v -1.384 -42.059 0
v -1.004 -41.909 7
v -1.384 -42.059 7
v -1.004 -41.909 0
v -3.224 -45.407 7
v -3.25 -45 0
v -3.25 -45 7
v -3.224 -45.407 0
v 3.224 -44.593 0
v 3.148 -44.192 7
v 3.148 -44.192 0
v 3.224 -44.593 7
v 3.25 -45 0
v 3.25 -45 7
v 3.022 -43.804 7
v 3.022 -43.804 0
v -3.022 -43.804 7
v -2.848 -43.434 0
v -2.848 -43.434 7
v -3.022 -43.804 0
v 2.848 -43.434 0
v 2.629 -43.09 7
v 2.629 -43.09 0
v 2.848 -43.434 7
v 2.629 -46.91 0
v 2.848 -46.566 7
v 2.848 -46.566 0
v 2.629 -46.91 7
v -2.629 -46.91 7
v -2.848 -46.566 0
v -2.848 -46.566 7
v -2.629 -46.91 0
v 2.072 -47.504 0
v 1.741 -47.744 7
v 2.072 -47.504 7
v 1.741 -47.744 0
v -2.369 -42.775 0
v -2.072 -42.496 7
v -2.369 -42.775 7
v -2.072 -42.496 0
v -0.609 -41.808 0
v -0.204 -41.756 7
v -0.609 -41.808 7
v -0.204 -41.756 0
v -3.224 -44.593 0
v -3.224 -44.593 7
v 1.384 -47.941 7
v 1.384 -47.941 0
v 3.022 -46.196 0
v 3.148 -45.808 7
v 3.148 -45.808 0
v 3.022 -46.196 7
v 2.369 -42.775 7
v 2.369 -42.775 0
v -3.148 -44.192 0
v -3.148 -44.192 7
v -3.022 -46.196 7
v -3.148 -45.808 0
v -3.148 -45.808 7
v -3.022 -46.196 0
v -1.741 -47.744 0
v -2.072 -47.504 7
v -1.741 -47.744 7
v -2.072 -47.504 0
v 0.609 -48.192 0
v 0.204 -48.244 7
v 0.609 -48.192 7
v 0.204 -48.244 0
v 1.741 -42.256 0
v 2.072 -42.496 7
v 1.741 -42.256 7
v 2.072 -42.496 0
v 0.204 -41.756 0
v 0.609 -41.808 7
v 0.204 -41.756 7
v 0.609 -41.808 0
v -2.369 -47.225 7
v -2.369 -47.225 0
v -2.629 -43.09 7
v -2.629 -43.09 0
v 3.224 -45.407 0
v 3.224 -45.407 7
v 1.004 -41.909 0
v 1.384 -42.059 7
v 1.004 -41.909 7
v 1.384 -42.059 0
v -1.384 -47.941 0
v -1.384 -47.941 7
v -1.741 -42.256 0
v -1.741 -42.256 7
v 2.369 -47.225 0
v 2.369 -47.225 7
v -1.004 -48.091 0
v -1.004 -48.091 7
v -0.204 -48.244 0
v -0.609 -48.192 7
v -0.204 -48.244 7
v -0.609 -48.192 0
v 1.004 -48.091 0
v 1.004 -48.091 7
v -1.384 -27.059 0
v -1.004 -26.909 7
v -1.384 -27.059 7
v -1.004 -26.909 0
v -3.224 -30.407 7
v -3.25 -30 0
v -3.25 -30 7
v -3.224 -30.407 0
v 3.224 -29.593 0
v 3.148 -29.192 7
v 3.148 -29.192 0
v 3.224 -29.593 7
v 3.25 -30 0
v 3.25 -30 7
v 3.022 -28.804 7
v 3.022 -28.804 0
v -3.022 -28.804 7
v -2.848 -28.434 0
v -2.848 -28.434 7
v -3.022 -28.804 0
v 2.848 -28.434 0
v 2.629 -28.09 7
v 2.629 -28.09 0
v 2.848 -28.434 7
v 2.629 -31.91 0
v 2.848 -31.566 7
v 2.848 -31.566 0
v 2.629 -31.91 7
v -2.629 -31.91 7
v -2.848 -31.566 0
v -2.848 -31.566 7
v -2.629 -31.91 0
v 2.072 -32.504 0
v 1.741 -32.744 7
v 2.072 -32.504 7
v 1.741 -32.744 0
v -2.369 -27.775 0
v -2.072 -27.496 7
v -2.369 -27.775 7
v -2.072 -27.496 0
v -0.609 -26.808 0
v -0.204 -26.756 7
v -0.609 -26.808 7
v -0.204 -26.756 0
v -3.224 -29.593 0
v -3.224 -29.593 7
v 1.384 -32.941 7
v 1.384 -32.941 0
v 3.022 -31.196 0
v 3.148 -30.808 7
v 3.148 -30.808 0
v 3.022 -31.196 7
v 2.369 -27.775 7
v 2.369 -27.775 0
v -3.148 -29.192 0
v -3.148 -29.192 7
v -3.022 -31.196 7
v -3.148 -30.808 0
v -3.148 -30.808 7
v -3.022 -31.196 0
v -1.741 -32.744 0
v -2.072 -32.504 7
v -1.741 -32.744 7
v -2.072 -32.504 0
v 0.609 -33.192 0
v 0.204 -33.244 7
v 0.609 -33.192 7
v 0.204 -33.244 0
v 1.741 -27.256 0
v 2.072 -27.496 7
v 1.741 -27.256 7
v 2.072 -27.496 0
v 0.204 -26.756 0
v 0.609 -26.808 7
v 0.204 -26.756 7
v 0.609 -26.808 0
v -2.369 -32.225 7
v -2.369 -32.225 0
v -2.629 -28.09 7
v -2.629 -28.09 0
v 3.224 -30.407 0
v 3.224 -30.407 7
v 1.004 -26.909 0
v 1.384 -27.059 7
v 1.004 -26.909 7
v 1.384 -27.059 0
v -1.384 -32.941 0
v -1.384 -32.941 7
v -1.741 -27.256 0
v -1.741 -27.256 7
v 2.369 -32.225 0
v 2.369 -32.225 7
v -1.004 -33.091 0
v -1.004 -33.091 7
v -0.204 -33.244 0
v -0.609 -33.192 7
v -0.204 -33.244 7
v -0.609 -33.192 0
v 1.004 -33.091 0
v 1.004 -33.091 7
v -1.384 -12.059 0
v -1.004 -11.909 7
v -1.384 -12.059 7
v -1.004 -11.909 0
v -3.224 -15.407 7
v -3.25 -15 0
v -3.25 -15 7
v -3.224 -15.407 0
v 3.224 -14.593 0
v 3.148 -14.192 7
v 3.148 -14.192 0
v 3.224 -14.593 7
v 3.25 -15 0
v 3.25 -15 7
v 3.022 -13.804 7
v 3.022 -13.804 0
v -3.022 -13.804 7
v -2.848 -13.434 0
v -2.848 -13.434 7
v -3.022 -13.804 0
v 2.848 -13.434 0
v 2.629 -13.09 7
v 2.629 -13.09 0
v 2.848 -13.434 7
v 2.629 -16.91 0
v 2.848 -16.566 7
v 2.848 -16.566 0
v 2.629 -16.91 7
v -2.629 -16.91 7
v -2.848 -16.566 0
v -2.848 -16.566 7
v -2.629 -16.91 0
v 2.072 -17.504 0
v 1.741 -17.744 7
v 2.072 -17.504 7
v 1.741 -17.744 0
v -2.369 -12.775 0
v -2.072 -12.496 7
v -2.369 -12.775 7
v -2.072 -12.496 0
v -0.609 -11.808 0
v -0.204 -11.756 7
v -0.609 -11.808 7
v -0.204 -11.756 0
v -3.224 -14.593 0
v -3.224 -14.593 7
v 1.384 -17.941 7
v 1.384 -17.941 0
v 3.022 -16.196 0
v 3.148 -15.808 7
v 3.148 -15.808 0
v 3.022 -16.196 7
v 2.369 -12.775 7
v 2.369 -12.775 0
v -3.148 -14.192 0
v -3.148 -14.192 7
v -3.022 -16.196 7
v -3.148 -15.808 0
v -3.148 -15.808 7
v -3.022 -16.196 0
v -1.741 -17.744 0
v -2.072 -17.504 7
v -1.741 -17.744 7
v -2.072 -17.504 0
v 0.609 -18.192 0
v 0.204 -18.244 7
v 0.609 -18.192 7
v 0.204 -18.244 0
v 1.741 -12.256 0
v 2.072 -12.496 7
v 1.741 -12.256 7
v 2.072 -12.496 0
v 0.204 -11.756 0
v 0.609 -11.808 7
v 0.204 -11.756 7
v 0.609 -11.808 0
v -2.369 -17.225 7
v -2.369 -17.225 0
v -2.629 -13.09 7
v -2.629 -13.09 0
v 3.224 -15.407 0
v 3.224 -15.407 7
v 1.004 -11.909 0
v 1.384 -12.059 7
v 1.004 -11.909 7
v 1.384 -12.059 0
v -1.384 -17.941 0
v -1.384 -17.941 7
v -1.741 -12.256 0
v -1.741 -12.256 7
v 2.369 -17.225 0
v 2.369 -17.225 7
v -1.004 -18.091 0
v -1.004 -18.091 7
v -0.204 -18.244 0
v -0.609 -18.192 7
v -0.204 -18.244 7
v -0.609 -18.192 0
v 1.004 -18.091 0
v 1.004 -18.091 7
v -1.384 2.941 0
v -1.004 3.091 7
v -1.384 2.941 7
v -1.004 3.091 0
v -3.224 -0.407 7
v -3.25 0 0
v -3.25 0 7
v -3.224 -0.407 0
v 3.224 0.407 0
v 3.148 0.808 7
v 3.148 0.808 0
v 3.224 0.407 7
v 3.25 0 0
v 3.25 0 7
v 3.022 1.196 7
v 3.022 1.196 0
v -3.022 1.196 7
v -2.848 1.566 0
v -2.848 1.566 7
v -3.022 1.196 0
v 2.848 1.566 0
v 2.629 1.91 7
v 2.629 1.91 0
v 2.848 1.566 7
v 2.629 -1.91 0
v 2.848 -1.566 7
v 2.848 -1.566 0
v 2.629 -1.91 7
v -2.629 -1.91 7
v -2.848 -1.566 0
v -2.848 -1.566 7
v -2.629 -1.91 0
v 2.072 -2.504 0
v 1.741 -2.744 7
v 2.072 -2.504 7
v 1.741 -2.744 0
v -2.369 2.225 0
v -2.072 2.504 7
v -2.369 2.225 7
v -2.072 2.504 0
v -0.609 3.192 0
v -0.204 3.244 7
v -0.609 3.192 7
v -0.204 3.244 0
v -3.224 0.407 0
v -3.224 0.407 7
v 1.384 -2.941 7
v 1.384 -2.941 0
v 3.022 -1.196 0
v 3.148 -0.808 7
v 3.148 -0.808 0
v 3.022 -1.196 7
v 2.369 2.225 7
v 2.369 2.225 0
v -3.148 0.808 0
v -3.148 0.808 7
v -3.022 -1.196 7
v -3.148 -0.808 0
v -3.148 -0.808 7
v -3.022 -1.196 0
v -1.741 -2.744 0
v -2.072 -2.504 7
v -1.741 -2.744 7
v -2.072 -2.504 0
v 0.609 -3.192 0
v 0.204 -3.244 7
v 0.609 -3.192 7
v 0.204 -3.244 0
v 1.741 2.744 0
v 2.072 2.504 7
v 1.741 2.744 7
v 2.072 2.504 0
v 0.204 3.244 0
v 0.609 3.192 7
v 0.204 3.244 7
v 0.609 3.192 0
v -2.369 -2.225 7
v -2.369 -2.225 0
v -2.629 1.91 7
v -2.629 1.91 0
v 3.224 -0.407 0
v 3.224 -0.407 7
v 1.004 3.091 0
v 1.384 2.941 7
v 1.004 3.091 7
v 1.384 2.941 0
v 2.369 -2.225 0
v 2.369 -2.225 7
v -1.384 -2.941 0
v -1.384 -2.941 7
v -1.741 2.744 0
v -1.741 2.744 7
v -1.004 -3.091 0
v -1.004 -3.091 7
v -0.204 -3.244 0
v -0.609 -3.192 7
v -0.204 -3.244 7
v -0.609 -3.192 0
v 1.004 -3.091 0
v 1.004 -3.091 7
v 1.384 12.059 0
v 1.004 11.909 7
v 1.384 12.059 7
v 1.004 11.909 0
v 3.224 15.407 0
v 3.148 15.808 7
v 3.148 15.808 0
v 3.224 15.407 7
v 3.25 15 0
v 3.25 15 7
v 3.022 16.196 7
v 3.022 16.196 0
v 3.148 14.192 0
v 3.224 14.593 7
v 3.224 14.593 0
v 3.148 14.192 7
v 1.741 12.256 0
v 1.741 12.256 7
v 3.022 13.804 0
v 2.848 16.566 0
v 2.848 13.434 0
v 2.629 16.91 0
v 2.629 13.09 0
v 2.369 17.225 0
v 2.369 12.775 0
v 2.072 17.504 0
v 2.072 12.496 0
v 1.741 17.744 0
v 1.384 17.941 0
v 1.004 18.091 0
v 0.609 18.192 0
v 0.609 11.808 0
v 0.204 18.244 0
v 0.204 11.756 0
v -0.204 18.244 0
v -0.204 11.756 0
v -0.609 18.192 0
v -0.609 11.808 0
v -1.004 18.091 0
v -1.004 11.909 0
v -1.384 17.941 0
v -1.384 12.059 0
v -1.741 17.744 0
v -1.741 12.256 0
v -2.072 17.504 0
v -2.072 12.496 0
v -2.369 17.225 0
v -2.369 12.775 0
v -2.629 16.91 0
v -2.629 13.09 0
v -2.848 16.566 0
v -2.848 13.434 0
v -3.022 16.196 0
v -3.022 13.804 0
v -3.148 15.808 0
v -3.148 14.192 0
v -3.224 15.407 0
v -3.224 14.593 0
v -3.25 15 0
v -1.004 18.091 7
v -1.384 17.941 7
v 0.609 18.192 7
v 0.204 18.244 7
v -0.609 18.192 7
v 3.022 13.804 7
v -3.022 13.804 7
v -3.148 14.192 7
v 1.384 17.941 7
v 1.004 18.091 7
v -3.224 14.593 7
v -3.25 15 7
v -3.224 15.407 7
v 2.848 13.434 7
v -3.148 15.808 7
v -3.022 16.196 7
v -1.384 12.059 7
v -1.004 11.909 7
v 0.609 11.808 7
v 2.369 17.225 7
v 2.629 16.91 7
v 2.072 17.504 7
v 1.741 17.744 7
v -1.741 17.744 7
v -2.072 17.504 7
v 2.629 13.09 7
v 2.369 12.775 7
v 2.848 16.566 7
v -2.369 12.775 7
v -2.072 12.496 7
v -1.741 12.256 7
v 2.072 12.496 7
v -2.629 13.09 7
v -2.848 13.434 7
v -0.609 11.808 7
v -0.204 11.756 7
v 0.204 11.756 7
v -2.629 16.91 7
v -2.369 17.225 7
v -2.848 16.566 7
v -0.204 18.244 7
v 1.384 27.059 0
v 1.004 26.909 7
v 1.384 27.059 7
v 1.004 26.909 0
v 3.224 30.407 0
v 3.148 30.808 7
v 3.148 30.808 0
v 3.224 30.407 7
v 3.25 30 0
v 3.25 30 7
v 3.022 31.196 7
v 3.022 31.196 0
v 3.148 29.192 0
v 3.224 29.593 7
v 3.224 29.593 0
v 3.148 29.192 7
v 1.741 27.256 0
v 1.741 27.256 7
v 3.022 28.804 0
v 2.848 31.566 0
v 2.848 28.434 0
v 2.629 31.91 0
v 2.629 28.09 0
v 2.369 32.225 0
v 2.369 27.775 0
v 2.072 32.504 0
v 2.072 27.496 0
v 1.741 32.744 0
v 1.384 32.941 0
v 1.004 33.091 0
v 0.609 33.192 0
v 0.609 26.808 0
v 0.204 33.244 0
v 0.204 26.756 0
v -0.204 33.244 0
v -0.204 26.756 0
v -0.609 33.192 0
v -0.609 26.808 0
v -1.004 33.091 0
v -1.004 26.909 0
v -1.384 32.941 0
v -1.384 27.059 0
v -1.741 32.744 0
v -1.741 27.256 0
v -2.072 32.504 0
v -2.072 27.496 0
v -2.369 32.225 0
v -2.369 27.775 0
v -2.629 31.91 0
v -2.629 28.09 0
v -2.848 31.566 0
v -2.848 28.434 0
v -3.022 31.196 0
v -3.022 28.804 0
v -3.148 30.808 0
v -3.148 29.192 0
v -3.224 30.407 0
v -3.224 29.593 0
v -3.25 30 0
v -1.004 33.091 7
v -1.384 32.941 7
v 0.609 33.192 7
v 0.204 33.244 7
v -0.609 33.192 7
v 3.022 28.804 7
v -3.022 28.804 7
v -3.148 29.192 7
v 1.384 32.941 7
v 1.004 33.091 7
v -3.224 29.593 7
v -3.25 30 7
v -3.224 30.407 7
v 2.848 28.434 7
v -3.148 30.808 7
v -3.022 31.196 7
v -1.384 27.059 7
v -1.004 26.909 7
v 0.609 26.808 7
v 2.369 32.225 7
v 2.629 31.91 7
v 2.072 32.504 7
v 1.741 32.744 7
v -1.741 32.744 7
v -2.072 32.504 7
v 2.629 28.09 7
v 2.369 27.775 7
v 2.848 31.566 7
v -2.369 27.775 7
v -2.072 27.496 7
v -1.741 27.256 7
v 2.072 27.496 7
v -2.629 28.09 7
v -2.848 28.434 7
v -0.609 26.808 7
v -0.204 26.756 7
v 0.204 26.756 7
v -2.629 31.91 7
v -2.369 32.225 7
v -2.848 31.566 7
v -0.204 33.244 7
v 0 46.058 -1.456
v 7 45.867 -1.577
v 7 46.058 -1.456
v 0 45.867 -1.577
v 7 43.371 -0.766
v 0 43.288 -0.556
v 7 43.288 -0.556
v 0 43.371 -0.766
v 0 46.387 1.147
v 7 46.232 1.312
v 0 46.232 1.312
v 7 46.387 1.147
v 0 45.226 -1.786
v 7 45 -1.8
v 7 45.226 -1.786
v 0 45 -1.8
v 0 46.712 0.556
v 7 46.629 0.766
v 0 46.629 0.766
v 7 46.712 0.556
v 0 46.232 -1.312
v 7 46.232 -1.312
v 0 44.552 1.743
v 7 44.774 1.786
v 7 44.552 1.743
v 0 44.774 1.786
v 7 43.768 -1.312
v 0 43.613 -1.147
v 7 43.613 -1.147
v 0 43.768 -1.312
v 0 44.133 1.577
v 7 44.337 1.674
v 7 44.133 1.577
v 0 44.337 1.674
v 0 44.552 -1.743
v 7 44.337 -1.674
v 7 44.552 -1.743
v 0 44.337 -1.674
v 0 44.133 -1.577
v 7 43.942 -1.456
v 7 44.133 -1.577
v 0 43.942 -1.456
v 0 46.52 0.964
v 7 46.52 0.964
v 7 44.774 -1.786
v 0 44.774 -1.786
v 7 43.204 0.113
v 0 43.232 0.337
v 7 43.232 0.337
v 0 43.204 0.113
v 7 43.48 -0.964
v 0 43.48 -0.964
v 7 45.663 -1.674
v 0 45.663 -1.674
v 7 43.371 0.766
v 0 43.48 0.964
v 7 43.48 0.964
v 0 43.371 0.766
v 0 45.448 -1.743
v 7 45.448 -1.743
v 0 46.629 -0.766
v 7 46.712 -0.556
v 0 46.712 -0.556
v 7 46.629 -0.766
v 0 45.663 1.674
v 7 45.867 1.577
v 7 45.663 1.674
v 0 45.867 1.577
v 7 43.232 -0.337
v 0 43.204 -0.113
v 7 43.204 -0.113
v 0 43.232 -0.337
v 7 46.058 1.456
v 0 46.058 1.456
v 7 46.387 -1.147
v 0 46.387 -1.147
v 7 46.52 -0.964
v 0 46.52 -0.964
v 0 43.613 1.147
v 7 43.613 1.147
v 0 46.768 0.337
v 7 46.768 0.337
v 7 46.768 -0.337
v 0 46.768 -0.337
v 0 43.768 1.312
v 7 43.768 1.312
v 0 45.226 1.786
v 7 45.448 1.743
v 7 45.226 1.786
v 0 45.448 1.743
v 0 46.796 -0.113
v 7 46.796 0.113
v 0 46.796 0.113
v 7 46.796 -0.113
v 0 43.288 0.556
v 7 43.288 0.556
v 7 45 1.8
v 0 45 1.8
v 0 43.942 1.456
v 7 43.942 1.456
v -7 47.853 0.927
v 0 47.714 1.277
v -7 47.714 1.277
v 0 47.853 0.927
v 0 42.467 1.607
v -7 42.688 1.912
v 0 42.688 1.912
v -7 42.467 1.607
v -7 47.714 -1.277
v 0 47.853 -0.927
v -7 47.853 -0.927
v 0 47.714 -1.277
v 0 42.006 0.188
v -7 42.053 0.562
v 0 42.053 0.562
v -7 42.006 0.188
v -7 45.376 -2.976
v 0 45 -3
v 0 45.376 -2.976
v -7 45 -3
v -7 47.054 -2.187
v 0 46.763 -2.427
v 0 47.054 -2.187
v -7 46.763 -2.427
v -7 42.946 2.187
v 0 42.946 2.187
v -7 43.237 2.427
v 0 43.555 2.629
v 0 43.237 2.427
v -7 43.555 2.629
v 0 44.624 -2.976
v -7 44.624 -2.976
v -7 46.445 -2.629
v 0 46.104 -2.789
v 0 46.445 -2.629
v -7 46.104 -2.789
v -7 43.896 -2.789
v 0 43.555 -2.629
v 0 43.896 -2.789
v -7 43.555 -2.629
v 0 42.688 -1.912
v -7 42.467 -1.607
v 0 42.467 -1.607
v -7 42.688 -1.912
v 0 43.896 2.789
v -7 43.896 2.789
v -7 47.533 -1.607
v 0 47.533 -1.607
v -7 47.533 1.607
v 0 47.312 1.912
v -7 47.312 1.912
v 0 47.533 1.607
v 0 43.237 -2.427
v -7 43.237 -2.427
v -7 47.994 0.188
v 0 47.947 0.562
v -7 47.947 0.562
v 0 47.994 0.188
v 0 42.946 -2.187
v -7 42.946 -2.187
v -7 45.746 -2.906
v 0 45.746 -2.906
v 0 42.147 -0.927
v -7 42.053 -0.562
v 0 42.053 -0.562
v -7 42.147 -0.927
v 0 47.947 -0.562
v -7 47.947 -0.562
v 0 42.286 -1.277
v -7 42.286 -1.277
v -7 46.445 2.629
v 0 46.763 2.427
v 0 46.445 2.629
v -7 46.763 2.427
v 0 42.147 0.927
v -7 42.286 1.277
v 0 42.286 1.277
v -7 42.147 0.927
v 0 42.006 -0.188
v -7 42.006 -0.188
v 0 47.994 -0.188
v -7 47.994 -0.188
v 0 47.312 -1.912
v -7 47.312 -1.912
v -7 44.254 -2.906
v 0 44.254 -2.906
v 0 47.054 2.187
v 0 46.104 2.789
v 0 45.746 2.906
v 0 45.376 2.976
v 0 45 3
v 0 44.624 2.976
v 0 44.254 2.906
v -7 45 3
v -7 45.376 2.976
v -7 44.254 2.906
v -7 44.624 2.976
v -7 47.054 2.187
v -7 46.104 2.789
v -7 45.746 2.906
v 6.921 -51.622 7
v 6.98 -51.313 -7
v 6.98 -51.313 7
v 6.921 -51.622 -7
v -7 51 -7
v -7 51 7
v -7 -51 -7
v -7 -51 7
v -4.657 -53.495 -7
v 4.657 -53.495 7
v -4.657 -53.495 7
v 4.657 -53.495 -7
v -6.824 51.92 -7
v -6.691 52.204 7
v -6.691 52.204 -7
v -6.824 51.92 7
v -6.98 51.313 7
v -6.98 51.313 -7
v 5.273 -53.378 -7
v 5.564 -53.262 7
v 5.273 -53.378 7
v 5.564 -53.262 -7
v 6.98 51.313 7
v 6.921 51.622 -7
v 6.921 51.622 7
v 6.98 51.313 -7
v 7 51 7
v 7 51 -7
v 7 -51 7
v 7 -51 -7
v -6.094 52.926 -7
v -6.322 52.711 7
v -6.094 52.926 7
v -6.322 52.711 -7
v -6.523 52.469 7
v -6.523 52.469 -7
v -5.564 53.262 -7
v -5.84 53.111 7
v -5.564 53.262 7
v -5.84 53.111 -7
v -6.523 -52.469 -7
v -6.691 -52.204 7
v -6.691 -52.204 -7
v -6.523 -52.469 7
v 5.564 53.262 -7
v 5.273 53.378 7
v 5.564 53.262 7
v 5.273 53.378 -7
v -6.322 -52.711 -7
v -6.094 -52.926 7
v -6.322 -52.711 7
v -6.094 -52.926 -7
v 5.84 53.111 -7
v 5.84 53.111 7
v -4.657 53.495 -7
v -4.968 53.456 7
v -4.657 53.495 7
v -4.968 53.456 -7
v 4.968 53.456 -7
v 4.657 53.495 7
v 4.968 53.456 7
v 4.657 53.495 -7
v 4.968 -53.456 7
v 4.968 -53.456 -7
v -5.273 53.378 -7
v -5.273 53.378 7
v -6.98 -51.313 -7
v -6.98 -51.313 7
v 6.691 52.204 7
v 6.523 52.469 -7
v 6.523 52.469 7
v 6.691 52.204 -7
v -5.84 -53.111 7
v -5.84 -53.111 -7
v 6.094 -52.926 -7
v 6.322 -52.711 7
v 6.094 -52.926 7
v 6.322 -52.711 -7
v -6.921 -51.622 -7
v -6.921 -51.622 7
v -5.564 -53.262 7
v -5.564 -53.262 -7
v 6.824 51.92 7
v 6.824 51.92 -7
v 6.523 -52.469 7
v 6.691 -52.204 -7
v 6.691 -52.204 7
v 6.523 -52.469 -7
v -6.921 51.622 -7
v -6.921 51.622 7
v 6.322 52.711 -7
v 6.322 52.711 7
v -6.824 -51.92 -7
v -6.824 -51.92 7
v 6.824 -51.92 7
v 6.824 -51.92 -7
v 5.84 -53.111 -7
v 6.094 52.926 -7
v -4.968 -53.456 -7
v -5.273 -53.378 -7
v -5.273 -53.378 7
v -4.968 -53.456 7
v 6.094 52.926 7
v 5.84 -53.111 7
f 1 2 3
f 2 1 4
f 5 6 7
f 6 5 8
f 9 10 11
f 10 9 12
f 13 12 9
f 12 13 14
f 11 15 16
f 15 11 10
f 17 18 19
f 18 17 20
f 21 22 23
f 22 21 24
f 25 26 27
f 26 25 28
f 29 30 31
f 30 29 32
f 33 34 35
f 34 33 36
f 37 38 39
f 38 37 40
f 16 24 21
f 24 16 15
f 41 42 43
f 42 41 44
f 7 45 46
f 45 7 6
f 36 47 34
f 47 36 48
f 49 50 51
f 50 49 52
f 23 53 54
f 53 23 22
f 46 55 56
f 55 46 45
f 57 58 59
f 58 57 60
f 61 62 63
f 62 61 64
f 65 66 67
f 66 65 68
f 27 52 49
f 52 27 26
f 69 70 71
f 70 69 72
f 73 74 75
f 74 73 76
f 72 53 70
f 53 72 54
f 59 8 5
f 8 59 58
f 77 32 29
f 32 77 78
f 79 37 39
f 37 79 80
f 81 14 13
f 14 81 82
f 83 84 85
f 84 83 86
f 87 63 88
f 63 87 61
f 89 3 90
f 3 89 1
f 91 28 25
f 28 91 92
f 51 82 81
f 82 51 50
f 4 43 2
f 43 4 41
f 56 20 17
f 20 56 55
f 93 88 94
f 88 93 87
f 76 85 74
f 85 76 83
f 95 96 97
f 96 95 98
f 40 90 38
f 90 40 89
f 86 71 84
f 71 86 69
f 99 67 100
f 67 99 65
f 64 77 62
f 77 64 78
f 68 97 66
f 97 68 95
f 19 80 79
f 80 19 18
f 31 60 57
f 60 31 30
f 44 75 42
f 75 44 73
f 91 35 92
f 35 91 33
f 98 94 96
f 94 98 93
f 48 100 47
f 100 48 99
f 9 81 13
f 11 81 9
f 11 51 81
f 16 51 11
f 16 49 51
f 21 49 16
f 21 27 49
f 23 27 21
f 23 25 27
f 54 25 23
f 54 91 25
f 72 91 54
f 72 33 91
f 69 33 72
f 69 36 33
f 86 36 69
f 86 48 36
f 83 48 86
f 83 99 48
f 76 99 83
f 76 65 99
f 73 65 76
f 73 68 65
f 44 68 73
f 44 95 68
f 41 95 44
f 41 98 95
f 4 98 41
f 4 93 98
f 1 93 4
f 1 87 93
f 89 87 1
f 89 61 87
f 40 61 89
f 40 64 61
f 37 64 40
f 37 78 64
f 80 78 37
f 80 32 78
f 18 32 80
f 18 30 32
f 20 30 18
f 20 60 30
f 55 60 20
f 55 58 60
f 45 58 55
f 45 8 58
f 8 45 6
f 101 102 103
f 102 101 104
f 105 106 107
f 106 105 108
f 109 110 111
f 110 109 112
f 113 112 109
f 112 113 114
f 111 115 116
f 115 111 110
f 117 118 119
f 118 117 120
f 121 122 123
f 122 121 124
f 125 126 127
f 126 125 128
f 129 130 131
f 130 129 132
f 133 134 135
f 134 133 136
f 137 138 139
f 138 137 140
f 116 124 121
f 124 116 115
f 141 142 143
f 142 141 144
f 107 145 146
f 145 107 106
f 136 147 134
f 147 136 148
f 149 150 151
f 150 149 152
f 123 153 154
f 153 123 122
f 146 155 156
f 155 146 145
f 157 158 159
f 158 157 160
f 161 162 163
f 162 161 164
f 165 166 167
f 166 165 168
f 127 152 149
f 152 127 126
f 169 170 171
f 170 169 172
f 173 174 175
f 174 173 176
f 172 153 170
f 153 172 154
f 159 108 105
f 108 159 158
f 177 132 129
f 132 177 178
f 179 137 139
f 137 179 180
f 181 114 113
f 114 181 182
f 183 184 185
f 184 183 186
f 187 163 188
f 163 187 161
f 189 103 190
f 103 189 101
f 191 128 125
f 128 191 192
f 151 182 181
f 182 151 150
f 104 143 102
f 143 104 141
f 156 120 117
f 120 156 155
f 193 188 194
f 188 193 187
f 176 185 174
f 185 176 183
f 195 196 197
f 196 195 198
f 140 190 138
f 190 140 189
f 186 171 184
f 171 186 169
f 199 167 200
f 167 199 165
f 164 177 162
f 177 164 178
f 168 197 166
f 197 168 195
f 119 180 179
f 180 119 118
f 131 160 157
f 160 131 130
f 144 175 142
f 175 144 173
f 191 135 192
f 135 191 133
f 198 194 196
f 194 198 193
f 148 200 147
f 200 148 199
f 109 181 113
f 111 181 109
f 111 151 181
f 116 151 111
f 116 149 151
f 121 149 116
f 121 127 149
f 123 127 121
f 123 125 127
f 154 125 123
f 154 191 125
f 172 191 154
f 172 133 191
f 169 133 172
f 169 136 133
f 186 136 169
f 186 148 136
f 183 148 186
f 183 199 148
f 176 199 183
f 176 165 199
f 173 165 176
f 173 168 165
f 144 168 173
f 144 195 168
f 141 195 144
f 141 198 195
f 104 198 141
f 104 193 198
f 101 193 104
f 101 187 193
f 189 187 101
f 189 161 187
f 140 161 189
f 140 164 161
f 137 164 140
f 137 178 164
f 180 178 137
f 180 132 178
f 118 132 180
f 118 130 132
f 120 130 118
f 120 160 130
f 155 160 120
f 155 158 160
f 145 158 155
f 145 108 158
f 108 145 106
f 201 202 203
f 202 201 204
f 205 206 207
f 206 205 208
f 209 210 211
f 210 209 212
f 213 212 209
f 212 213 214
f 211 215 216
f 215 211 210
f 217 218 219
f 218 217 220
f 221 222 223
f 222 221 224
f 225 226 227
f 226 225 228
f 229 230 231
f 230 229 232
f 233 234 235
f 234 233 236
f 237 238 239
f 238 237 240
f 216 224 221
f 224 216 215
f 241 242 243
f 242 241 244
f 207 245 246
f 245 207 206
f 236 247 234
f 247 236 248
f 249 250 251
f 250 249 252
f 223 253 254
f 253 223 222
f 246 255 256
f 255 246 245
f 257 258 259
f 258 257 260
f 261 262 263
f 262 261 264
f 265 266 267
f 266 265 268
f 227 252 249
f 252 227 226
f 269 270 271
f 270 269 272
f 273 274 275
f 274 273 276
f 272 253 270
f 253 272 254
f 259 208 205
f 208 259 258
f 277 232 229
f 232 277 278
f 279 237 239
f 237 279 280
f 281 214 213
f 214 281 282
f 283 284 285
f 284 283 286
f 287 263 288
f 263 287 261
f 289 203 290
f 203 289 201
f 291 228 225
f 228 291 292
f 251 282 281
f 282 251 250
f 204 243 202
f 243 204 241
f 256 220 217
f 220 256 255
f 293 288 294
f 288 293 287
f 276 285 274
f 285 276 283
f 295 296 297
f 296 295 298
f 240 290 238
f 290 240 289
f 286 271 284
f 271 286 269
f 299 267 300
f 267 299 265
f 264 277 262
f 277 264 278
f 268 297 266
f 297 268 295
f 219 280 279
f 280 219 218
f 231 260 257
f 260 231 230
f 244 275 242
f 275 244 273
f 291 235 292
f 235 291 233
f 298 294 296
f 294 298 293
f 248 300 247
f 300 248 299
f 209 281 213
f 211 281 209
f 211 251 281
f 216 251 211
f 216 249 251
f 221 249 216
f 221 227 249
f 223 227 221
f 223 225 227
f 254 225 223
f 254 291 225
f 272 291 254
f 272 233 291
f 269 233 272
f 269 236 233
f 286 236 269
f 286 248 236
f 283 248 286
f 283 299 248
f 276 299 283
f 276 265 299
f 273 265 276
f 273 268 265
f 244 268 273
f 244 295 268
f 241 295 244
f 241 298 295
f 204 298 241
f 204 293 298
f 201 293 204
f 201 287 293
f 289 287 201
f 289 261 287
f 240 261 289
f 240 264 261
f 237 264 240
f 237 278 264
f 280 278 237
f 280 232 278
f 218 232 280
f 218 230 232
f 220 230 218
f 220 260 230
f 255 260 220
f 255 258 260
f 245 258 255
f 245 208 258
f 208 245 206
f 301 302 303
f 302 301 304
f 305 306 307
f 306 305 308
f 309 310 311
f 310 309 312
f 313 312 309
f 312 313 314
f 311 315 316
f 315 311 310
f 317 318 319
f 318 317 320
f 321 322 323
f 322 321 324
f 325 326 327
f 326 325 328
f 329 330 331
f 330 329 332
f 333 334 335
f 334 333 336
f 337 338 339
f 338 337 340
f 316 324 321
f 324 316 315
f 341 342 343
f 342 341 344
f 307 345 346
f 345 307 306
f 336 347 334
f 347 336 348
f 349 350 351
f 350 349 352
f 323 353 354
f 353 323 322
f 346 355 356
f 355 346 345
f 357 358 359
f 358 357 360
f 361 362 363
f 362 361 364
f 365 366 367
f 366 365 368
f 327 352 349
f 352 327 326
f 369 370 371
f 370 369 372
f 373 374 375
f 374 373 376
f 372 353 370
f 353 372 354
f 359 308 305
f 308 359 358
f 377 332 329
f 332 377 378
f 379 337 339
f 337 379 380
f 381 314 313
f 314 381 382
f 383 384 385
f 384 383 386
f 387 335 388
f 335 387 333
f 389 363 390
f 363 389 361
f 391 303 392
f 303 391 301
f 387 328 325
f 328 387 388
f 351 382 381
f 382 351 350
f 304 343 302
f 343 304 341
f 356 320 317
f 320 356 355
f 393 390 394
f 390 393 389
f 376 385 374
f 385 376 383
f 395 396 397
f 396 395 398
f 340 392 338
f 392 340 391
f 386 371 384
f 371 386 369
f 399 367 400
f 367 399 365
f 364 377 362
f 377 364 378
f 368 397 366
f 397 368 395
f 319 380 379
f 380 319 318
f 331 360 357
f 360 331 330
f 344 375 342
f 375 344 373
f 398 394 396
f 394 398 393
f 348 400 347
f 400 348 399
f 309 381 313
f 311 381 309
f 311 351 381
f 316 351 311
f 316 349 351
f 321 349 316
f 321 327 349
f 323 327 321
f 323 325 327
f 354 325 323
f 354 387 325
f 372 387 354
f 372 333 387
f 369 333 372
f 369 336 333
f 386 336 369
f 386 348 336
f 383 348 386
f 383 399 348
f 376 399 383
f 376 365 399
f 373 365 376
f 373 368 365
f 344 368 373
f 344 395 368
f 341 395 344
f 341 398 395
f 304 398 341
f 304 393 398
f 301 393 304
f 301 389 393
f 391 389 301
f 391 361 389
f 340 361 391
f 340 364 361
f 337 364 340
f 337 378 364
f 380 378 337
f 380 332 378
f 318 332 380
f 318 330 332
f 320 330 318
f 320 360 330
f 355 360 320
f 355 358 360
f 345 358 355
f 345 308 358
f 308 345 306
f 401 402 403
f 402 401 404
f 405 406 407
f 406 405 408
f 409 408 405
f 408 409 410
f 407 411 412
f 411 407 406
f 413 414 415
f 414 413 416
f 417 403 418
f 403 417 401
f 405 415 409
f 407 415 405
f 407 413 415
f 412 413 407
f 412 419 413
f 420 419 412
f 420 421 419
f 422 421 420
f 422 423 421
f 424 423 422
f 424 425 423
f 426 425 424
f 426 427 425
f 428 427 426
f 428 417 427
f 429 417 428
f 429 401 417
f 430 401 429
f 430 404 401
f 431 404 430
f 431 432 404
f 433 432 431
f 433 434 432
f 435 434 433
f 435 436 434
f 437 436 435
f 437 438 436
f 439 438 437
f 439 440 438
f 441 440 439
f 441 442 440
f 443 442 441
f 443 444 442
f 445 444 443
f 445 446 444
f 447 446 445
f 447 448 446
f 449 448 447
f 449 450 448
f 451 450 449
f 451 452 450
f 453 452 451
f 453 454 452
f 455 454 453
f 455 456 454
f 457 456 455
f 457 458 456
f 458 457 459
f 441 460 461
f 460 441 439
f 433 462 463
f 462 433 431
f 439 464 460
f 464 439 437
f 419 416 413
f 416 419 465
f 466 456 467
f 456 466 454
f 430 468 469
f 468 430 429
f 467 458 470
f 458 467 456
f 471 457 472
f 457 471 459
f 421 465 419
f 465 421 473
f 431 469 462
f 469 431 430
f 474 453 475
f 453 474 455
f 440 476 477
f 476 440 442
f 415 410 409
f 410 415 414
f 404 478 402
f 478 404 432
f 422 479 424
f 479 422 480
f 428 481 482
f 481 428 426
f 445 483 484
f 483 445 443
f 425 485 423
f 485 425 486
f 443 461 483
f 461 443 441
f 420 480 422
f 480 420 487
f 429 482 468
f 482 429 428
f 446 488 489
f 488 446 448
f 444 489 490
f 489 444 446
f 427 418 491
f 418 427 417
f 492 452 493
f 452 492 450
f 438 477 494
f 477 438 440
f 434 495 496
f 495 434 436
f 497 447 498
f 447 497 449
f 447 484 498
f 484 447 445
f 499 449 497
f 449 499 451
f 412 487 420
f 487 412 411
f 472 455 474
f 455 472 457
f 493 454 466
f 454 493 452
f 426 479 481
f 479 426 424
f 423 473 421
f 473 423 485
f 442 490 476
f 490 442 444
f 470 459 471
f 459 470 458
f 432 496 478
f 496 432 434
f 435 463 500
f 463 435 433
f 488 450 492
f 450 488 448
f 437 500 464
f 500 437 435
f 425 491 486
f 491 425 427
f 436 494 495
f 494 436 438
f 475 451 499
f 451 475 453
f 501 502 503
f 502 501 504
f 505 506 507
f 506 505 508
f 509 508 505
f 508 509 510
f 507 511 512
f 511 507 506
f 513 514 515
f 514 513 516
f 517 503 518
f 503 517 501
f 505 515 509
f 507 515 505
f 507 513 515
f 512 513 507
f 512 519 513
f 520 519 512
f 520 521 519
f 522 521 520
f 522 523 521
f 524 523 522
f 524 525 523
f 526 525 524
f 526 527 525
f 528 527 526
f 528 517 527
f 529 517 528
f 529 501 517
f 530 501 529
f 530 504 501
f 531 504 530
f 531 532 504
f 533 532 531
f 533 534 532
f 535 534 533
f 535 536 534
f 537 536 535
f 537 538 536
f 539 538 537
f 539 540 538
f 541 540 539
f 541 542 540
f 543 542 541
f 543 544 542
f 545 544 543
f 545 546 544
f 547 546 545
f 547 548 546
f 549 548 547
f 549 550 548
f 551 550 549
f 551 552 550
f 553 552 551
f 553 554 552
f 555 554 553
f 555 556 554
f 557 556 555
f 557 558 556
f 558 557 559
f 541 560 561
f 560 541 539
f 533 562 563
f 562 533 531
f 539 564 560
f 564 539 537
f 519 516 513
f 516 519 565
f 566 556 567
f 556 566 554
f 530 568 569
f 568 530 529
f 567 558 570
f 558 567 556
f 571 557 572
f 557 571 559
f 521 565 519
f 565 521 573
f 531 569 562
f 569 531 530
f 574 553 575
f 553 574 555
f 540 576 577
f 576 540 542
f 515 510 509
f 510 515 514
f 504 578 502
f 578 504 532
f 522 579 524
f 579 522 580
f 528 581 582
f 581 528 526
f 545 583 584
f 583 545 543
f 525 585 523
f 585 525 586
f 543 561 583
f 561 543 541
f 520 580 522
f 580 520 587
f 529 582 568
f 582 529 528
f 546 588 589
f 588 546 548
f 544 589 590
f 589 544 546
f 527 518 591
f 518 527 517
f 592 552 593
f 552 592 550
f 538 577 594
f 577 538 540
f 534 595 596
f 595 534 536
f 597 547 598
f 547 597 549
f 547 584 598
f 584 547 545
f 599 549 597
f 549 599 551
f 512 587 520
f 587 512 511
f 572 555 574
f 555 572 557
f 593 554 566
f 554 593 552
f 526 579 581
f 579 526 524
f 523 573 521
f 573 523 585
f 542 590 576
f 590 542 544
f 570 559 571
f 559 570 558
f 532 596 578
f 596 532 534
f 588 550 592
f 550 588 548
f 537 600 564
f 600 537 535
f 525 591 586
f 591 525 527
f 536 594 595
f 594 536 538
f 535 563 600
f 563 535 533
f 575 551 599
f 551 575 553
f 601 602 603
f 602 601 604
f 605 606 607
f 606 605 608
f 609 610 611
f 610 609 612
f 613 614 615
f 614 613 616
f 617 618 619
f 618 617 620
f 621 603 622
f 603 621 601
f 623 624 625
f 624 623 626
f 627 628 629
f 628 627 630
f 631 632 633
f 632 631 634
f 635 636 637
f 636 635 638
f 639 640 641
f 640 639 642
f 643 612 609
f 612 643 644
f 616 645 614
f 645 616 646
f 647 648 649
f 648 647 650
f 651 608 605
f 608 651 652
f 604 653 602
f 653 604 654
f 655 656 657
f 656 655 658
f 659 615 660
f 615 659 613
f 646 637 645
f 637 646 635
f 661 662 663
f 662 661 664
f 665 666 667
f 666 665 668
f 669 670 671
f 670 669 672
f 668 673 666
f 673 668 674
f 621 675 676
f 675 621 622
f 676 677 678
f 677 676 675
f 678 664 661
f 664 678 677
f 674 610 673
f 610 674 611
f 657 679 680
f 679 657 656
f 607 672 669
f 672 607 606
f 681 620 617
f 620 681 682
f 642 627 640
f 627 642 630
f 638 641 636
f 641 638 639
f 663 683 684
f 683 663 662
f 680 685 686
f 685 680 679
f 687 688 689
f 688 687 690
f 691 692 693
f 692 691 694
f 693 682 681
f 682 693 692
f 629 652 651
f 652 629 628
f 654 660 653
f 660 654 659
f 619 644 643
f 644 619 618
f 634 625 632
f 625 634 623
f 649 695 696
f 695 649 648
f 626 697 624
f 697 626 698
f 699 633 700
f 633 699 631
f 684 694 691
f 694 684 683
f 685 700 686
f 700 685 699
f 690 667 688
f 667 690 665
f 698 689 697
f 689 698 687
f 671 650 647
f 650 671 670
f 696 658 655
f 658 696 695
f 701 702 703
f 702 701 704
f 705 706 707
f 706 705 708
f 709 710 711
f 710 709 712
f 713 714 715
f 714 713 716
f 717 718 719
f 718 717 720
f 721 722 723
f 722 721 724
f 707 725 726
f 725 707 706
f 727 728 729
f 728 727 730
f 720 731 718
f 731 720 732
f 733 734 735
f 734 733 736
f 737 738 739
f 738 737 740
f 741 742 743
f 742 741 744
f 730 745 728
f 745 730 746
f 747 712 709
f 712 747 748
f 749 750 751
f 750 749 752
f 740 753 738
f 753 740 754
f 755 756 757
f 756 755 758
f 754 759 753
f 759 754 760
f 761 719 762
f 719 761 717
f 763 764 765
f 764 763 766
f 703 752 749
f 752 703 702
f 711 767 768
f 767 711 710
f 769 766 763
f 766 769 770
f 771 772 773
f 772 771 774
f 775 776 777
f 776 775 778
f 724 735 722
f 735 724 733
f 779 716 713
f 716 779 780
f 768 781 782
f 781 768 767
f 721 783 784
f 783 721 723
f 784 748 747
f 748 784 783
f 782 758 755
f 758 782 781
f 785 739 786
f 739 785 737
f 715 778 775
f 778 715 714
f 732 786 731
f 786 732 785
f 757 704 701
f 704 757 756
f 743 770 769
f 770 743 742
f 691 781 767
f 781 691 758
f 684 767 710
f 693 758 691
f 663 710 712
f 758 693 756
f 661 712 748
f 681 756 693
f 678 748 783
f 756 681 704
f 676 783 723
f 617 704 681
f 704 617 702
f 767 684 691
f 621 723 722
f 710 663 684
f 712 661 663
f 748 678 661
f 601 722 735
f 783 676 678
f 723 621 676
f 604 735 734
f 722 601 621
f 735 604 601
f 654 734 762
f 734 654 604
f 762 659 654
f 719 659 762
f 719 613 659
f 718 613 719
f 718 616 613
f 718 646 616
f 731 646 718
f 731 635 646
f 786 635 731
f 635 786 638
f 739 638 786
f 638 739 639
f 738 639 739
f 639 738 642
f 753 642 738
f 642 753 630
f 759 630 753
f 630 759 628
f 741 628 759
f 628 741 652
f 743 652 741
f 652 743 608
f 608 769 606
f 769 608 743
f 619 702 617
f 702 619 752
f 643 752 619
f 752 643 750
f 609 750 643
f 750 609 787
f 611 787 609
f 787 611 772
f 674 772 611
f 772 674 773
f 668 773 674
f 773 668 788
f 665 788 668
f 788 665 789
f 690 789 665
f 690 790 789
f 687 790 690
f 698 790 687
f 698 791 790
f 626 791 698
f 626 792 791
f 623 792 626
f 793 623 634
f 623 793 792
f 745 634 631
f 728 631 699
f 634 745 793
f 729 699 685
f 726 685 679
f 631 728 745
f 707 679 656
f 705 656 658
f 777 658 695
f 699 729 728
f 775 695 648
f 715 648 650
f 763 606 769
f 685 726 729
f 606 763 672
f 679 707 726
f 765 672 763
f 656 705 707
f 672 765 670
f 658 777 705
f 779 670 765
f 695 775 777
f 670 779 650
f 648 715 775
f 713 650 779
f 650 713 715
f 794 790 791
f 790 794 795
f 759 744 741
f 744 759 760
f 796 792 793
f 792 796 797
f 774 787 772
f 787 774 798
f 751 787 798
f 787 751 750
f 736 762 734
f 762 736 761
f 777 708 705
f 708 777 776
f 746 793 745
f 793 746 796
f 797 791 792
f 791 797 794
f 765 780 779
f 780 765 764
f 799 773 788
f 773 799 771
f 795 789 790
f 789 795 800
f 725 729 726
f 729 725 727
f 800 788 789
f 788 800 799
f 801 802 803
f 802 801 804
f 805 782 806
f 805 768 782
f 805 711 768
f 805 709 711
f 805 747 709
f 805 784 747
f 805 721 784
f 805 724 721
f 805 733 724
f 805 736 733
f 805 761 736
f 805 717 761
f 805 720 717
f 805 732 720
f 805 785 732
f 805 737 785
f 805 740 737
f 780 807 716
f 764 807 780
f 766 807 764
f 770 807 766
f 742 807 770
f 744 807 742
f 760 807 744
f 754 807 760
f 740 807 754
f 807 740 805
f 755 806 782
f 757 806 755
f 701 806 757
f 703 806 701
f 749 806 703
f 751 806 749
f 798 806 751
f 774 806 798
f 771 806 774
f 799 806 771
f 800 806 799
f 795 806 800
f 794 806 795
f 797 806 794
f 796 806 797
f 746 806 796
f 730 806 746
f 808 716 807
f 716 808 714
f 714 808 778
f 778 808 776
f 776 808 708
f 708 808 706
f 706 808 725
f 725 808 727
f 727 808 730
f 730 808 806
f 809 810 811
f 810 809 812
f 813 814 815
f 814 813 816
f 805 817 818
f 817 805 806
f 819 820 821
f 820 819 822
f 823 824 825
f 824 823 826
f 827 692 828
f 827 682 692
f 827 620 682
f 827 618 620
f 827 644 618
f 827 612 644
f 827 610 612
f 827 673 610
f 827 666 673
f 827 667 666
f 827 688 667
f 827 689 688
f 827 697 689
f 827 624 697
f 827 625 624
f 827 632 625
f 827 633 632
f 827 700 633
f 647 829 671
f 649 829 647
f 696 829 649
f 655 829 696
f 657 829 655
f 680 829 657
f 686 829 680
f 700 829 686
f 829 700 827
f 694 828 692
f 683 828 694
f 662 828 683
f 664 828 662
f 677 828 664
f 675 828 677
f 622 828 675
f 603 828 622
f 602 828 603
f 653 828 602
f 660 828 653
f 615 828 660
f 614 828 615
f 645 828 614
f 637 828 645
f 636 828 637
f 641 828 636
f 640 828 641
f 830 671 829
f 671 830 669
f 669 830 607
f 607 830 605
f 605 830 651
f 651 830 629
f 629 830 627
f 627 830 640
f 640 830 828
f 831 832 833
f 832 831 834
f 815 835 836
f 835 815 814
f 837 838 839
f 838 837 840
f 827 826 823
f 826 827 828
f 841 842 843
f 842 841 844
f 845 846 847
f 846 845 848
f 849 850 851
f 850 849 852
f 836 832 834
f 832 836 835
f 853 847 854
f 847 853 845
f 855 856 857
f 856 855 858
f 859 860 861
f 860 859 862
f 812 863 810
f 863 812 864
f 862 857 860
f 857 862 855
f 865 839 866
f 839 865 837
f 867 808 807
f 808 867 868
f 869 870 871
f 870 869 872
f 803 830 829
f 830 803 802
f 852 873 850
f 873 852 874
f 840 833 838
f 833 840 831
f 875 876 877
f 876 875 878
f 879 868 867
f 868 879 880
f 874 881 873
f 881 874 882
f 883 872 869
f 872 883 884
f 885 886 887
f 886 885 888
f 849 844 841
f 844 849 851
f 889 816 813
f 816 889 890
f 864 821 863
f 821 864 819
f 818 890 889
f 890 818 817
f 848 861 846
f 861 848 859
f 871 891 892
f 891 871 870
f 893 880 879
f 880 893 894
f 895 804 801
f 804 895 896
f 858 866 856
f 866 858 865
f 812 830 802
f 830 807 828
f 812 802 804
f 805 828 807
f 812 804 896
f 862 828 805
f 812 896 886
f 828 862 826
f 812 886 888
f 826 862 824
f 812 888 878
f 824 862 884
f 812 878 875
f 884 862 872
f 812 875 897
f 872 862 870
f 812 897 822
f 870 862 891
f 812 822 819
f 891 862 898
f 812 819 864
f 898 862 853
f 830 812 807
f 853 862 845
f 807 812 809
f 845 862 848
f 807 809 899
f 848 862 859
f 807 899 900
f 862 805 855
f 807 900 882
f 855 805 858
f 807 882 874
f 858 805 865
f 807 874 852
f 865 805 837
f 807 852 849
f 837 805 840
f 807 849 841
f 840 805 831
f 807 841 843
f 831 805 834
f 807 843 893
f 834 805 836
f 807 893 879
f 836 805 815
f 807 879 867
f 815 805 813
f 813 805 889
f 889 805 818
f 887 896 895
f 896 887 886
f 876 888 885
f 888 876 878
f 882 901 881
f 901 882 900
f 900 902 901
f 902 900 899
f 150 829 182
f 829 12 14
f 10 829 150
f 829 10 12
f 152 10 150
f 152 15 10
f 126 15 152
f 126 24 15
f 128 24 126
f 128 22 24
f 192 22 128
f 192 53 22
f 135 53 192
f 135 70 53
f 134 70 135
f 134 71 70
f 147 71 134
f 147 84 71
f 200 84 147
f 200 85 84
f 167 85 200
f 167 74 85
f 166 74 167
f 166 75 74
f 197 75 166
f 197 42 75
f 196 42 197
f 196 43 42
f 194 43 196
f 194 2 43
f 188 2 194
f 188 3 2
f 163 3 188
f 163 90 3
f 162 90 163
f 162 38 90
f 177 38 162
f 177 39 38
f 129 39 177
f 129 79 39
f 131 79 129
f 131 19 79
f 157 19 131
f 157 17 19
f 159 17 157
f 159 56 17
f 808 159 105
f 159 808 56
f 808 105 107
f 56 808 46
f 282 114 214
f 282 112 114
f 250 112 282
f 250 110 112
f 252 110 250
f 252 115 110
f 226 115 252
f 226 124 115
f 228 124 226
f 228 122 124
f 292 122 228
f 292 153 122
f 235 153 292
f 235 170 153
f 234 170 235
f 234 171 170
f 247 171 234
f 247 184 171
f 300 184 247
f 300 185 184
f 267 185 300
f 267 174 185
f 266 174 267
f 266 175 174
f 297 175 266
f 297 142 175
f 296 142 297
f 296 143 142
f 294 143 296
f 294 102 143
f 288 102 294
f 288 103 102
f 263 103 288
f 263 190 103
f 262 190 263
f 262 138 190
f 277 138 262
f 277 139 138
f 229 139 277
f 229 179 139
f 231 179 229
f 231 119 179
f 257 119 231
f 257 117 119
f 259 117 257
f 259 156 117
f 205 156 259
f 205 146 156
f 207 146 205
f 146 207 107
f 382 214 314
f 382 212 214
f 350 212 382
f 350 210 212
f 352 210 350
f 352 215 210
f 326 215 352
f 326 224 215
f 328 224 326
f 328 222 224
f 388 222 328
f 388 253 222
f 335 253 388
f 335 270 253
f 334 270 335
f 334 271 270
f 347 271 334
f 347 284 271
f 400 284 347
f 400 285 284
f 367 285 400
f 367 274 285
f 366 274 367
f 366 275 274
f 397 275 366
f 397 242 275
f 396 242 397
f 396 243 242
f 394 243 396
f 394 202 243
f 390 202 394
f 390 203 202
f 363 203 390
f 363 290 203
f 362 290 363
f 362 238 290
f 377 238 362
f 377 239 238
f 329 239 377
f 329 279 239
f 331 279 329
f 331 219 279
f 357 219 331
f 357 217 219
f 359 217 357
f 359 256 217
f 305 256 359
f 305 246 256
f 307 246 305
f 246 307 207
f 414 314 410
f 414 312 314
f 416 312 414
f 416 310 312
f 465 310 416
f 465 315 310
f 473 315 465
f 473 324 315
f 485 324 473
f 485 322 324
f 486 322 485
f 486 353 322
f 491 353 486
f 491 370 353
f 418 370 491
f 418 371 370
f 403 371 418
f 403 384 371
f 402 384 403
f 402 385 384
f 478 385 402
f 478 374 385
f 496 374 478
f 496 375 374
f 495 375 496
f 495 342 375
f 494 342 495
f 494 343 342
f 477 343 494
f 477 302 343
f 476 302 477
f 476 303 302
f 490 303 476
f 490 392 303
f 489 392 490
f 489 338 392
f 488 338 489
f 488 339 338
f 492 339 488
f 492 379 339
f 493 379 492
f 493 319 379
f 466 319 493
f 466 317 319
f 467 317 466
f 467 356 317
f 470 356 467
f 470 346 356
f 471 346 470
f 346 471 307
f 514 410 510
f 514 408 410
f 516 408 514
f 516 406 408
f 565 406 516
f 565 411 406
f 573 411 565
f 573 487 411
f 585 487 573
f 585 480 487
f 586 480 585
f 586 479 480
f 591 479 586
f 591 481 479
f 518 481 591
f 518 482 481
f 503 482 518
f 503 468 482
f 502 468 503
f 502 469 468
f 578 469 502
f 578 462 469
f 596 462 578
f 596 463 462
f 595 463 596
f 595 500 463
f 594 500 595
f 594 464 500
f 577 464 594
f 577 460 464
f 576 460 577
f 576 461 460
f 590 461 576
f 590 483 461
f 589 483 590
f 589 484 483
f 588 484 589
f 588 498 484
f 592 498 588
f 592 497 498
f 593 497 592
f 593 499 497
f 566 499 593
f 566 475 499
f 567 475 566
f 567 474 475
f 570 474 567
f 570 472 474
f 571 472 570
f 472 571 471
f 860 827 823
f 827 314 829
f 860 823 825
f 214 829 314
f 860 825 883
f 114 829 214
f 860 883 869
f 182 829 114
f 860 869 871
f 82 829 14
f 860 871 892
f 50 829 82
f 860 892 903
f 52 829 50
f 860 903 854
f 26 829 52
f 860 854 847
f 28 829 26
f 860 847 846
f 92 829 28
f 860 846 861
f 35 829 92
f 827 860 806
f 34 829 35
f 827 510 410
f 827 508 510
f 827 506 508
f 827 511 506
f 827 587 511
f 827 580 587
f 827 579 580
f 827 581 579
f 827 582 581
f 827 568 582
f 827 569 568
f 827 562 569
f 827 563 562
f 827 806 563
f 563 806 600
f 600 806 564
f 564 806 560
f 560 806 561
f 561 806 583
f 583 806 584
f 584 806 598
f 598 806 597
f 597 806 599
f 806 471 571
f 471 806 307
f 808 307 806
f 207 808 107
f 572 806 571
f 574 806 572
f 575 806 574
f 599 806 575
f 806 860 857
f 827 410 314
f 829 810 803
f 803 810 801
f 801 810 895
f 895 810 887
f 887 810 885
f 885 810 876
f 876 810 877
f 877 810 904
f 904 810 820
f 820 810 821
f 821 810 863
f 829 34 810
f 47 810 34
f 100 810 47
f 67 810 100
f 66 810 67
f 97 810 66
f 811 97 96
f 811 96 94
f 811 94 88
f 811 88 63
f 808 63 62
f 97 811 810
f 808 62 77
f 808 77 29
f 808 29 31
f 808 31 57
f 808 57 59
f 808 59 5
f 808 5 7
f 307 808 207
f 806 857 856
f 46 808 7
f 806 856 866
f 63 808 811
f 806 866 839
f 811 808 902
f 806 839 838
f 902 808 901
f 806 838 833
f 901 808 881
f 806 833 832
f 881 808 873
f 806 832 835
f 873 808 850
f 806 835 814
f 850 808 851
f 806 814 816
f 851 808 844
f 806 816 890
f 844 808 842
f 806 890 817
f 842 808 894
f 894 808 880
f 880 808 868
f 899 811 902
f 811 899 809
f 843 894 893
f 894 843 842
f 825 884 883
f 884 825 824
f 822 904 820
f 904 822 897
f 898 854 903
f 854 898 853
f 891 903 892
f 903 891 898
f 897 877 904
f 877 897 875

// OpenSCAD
$fn = 50;


difference() {
	union() {
		translate(v = [0, 0, -7.0000000000]) {
			hull() {
				translate(v = [-4.5000000000, 51.0000000000, 0]) {
					cylinder(h = 14, r = 2.5000000000);
				}
				translate(v = [4.5000000000, 51.0000000000, 0]) {
					cylinder(h = 14, r = 2.5000000000);
				}
				translate(v = [-4.5000000000, -51.0000000000, 0]) {
					cylinder(h = 14, r = 2.5000000000);
				}
				translate(v = [4.5000000000, -51.0000000000, 0]) {
					cylinder(h = 14, r = 2.5000000000);
				}
			}
		}
	}
	union() {
		translate(v = [0.0000000000, -45.0000000000, 0]) {
			cylinder(h = 100, r = 3.2500000000);
		}
		translate(v = [0.0000000000, -30.0000000000, 0]) {
			cylinder(h = 100, r = 3.2500000000);
		}
		translate(v = [0.0000000000, -15.0000000000, 0]) {
			cylinder(h = 100, r = 3.2500000000);
		}
		cylinder(h = 100, r = 3.2500000000);
		translate(v = [0.0000000000, 15.0000000000, 0]) {
			cylinder(h = 100, r = 3.2500000000);
		}
		translate(v = [0.0000000000, 30.0000000000, 0]) {
			cylinder(h = 100, r = 3.2500000000);
		}
		translate(v = [-50, 45, 0]) {
			rotate(a = [0, 90, 0]) {
				cylinder(h = 100, r = 1.8000000000);
			}
		}
		translate(v = [-100, 45, 0]) {
			rotate(a = [0, 90, 0]) {
				cylinder(h = 100, r = 3.0000000000);
			}
		}
	}
}
